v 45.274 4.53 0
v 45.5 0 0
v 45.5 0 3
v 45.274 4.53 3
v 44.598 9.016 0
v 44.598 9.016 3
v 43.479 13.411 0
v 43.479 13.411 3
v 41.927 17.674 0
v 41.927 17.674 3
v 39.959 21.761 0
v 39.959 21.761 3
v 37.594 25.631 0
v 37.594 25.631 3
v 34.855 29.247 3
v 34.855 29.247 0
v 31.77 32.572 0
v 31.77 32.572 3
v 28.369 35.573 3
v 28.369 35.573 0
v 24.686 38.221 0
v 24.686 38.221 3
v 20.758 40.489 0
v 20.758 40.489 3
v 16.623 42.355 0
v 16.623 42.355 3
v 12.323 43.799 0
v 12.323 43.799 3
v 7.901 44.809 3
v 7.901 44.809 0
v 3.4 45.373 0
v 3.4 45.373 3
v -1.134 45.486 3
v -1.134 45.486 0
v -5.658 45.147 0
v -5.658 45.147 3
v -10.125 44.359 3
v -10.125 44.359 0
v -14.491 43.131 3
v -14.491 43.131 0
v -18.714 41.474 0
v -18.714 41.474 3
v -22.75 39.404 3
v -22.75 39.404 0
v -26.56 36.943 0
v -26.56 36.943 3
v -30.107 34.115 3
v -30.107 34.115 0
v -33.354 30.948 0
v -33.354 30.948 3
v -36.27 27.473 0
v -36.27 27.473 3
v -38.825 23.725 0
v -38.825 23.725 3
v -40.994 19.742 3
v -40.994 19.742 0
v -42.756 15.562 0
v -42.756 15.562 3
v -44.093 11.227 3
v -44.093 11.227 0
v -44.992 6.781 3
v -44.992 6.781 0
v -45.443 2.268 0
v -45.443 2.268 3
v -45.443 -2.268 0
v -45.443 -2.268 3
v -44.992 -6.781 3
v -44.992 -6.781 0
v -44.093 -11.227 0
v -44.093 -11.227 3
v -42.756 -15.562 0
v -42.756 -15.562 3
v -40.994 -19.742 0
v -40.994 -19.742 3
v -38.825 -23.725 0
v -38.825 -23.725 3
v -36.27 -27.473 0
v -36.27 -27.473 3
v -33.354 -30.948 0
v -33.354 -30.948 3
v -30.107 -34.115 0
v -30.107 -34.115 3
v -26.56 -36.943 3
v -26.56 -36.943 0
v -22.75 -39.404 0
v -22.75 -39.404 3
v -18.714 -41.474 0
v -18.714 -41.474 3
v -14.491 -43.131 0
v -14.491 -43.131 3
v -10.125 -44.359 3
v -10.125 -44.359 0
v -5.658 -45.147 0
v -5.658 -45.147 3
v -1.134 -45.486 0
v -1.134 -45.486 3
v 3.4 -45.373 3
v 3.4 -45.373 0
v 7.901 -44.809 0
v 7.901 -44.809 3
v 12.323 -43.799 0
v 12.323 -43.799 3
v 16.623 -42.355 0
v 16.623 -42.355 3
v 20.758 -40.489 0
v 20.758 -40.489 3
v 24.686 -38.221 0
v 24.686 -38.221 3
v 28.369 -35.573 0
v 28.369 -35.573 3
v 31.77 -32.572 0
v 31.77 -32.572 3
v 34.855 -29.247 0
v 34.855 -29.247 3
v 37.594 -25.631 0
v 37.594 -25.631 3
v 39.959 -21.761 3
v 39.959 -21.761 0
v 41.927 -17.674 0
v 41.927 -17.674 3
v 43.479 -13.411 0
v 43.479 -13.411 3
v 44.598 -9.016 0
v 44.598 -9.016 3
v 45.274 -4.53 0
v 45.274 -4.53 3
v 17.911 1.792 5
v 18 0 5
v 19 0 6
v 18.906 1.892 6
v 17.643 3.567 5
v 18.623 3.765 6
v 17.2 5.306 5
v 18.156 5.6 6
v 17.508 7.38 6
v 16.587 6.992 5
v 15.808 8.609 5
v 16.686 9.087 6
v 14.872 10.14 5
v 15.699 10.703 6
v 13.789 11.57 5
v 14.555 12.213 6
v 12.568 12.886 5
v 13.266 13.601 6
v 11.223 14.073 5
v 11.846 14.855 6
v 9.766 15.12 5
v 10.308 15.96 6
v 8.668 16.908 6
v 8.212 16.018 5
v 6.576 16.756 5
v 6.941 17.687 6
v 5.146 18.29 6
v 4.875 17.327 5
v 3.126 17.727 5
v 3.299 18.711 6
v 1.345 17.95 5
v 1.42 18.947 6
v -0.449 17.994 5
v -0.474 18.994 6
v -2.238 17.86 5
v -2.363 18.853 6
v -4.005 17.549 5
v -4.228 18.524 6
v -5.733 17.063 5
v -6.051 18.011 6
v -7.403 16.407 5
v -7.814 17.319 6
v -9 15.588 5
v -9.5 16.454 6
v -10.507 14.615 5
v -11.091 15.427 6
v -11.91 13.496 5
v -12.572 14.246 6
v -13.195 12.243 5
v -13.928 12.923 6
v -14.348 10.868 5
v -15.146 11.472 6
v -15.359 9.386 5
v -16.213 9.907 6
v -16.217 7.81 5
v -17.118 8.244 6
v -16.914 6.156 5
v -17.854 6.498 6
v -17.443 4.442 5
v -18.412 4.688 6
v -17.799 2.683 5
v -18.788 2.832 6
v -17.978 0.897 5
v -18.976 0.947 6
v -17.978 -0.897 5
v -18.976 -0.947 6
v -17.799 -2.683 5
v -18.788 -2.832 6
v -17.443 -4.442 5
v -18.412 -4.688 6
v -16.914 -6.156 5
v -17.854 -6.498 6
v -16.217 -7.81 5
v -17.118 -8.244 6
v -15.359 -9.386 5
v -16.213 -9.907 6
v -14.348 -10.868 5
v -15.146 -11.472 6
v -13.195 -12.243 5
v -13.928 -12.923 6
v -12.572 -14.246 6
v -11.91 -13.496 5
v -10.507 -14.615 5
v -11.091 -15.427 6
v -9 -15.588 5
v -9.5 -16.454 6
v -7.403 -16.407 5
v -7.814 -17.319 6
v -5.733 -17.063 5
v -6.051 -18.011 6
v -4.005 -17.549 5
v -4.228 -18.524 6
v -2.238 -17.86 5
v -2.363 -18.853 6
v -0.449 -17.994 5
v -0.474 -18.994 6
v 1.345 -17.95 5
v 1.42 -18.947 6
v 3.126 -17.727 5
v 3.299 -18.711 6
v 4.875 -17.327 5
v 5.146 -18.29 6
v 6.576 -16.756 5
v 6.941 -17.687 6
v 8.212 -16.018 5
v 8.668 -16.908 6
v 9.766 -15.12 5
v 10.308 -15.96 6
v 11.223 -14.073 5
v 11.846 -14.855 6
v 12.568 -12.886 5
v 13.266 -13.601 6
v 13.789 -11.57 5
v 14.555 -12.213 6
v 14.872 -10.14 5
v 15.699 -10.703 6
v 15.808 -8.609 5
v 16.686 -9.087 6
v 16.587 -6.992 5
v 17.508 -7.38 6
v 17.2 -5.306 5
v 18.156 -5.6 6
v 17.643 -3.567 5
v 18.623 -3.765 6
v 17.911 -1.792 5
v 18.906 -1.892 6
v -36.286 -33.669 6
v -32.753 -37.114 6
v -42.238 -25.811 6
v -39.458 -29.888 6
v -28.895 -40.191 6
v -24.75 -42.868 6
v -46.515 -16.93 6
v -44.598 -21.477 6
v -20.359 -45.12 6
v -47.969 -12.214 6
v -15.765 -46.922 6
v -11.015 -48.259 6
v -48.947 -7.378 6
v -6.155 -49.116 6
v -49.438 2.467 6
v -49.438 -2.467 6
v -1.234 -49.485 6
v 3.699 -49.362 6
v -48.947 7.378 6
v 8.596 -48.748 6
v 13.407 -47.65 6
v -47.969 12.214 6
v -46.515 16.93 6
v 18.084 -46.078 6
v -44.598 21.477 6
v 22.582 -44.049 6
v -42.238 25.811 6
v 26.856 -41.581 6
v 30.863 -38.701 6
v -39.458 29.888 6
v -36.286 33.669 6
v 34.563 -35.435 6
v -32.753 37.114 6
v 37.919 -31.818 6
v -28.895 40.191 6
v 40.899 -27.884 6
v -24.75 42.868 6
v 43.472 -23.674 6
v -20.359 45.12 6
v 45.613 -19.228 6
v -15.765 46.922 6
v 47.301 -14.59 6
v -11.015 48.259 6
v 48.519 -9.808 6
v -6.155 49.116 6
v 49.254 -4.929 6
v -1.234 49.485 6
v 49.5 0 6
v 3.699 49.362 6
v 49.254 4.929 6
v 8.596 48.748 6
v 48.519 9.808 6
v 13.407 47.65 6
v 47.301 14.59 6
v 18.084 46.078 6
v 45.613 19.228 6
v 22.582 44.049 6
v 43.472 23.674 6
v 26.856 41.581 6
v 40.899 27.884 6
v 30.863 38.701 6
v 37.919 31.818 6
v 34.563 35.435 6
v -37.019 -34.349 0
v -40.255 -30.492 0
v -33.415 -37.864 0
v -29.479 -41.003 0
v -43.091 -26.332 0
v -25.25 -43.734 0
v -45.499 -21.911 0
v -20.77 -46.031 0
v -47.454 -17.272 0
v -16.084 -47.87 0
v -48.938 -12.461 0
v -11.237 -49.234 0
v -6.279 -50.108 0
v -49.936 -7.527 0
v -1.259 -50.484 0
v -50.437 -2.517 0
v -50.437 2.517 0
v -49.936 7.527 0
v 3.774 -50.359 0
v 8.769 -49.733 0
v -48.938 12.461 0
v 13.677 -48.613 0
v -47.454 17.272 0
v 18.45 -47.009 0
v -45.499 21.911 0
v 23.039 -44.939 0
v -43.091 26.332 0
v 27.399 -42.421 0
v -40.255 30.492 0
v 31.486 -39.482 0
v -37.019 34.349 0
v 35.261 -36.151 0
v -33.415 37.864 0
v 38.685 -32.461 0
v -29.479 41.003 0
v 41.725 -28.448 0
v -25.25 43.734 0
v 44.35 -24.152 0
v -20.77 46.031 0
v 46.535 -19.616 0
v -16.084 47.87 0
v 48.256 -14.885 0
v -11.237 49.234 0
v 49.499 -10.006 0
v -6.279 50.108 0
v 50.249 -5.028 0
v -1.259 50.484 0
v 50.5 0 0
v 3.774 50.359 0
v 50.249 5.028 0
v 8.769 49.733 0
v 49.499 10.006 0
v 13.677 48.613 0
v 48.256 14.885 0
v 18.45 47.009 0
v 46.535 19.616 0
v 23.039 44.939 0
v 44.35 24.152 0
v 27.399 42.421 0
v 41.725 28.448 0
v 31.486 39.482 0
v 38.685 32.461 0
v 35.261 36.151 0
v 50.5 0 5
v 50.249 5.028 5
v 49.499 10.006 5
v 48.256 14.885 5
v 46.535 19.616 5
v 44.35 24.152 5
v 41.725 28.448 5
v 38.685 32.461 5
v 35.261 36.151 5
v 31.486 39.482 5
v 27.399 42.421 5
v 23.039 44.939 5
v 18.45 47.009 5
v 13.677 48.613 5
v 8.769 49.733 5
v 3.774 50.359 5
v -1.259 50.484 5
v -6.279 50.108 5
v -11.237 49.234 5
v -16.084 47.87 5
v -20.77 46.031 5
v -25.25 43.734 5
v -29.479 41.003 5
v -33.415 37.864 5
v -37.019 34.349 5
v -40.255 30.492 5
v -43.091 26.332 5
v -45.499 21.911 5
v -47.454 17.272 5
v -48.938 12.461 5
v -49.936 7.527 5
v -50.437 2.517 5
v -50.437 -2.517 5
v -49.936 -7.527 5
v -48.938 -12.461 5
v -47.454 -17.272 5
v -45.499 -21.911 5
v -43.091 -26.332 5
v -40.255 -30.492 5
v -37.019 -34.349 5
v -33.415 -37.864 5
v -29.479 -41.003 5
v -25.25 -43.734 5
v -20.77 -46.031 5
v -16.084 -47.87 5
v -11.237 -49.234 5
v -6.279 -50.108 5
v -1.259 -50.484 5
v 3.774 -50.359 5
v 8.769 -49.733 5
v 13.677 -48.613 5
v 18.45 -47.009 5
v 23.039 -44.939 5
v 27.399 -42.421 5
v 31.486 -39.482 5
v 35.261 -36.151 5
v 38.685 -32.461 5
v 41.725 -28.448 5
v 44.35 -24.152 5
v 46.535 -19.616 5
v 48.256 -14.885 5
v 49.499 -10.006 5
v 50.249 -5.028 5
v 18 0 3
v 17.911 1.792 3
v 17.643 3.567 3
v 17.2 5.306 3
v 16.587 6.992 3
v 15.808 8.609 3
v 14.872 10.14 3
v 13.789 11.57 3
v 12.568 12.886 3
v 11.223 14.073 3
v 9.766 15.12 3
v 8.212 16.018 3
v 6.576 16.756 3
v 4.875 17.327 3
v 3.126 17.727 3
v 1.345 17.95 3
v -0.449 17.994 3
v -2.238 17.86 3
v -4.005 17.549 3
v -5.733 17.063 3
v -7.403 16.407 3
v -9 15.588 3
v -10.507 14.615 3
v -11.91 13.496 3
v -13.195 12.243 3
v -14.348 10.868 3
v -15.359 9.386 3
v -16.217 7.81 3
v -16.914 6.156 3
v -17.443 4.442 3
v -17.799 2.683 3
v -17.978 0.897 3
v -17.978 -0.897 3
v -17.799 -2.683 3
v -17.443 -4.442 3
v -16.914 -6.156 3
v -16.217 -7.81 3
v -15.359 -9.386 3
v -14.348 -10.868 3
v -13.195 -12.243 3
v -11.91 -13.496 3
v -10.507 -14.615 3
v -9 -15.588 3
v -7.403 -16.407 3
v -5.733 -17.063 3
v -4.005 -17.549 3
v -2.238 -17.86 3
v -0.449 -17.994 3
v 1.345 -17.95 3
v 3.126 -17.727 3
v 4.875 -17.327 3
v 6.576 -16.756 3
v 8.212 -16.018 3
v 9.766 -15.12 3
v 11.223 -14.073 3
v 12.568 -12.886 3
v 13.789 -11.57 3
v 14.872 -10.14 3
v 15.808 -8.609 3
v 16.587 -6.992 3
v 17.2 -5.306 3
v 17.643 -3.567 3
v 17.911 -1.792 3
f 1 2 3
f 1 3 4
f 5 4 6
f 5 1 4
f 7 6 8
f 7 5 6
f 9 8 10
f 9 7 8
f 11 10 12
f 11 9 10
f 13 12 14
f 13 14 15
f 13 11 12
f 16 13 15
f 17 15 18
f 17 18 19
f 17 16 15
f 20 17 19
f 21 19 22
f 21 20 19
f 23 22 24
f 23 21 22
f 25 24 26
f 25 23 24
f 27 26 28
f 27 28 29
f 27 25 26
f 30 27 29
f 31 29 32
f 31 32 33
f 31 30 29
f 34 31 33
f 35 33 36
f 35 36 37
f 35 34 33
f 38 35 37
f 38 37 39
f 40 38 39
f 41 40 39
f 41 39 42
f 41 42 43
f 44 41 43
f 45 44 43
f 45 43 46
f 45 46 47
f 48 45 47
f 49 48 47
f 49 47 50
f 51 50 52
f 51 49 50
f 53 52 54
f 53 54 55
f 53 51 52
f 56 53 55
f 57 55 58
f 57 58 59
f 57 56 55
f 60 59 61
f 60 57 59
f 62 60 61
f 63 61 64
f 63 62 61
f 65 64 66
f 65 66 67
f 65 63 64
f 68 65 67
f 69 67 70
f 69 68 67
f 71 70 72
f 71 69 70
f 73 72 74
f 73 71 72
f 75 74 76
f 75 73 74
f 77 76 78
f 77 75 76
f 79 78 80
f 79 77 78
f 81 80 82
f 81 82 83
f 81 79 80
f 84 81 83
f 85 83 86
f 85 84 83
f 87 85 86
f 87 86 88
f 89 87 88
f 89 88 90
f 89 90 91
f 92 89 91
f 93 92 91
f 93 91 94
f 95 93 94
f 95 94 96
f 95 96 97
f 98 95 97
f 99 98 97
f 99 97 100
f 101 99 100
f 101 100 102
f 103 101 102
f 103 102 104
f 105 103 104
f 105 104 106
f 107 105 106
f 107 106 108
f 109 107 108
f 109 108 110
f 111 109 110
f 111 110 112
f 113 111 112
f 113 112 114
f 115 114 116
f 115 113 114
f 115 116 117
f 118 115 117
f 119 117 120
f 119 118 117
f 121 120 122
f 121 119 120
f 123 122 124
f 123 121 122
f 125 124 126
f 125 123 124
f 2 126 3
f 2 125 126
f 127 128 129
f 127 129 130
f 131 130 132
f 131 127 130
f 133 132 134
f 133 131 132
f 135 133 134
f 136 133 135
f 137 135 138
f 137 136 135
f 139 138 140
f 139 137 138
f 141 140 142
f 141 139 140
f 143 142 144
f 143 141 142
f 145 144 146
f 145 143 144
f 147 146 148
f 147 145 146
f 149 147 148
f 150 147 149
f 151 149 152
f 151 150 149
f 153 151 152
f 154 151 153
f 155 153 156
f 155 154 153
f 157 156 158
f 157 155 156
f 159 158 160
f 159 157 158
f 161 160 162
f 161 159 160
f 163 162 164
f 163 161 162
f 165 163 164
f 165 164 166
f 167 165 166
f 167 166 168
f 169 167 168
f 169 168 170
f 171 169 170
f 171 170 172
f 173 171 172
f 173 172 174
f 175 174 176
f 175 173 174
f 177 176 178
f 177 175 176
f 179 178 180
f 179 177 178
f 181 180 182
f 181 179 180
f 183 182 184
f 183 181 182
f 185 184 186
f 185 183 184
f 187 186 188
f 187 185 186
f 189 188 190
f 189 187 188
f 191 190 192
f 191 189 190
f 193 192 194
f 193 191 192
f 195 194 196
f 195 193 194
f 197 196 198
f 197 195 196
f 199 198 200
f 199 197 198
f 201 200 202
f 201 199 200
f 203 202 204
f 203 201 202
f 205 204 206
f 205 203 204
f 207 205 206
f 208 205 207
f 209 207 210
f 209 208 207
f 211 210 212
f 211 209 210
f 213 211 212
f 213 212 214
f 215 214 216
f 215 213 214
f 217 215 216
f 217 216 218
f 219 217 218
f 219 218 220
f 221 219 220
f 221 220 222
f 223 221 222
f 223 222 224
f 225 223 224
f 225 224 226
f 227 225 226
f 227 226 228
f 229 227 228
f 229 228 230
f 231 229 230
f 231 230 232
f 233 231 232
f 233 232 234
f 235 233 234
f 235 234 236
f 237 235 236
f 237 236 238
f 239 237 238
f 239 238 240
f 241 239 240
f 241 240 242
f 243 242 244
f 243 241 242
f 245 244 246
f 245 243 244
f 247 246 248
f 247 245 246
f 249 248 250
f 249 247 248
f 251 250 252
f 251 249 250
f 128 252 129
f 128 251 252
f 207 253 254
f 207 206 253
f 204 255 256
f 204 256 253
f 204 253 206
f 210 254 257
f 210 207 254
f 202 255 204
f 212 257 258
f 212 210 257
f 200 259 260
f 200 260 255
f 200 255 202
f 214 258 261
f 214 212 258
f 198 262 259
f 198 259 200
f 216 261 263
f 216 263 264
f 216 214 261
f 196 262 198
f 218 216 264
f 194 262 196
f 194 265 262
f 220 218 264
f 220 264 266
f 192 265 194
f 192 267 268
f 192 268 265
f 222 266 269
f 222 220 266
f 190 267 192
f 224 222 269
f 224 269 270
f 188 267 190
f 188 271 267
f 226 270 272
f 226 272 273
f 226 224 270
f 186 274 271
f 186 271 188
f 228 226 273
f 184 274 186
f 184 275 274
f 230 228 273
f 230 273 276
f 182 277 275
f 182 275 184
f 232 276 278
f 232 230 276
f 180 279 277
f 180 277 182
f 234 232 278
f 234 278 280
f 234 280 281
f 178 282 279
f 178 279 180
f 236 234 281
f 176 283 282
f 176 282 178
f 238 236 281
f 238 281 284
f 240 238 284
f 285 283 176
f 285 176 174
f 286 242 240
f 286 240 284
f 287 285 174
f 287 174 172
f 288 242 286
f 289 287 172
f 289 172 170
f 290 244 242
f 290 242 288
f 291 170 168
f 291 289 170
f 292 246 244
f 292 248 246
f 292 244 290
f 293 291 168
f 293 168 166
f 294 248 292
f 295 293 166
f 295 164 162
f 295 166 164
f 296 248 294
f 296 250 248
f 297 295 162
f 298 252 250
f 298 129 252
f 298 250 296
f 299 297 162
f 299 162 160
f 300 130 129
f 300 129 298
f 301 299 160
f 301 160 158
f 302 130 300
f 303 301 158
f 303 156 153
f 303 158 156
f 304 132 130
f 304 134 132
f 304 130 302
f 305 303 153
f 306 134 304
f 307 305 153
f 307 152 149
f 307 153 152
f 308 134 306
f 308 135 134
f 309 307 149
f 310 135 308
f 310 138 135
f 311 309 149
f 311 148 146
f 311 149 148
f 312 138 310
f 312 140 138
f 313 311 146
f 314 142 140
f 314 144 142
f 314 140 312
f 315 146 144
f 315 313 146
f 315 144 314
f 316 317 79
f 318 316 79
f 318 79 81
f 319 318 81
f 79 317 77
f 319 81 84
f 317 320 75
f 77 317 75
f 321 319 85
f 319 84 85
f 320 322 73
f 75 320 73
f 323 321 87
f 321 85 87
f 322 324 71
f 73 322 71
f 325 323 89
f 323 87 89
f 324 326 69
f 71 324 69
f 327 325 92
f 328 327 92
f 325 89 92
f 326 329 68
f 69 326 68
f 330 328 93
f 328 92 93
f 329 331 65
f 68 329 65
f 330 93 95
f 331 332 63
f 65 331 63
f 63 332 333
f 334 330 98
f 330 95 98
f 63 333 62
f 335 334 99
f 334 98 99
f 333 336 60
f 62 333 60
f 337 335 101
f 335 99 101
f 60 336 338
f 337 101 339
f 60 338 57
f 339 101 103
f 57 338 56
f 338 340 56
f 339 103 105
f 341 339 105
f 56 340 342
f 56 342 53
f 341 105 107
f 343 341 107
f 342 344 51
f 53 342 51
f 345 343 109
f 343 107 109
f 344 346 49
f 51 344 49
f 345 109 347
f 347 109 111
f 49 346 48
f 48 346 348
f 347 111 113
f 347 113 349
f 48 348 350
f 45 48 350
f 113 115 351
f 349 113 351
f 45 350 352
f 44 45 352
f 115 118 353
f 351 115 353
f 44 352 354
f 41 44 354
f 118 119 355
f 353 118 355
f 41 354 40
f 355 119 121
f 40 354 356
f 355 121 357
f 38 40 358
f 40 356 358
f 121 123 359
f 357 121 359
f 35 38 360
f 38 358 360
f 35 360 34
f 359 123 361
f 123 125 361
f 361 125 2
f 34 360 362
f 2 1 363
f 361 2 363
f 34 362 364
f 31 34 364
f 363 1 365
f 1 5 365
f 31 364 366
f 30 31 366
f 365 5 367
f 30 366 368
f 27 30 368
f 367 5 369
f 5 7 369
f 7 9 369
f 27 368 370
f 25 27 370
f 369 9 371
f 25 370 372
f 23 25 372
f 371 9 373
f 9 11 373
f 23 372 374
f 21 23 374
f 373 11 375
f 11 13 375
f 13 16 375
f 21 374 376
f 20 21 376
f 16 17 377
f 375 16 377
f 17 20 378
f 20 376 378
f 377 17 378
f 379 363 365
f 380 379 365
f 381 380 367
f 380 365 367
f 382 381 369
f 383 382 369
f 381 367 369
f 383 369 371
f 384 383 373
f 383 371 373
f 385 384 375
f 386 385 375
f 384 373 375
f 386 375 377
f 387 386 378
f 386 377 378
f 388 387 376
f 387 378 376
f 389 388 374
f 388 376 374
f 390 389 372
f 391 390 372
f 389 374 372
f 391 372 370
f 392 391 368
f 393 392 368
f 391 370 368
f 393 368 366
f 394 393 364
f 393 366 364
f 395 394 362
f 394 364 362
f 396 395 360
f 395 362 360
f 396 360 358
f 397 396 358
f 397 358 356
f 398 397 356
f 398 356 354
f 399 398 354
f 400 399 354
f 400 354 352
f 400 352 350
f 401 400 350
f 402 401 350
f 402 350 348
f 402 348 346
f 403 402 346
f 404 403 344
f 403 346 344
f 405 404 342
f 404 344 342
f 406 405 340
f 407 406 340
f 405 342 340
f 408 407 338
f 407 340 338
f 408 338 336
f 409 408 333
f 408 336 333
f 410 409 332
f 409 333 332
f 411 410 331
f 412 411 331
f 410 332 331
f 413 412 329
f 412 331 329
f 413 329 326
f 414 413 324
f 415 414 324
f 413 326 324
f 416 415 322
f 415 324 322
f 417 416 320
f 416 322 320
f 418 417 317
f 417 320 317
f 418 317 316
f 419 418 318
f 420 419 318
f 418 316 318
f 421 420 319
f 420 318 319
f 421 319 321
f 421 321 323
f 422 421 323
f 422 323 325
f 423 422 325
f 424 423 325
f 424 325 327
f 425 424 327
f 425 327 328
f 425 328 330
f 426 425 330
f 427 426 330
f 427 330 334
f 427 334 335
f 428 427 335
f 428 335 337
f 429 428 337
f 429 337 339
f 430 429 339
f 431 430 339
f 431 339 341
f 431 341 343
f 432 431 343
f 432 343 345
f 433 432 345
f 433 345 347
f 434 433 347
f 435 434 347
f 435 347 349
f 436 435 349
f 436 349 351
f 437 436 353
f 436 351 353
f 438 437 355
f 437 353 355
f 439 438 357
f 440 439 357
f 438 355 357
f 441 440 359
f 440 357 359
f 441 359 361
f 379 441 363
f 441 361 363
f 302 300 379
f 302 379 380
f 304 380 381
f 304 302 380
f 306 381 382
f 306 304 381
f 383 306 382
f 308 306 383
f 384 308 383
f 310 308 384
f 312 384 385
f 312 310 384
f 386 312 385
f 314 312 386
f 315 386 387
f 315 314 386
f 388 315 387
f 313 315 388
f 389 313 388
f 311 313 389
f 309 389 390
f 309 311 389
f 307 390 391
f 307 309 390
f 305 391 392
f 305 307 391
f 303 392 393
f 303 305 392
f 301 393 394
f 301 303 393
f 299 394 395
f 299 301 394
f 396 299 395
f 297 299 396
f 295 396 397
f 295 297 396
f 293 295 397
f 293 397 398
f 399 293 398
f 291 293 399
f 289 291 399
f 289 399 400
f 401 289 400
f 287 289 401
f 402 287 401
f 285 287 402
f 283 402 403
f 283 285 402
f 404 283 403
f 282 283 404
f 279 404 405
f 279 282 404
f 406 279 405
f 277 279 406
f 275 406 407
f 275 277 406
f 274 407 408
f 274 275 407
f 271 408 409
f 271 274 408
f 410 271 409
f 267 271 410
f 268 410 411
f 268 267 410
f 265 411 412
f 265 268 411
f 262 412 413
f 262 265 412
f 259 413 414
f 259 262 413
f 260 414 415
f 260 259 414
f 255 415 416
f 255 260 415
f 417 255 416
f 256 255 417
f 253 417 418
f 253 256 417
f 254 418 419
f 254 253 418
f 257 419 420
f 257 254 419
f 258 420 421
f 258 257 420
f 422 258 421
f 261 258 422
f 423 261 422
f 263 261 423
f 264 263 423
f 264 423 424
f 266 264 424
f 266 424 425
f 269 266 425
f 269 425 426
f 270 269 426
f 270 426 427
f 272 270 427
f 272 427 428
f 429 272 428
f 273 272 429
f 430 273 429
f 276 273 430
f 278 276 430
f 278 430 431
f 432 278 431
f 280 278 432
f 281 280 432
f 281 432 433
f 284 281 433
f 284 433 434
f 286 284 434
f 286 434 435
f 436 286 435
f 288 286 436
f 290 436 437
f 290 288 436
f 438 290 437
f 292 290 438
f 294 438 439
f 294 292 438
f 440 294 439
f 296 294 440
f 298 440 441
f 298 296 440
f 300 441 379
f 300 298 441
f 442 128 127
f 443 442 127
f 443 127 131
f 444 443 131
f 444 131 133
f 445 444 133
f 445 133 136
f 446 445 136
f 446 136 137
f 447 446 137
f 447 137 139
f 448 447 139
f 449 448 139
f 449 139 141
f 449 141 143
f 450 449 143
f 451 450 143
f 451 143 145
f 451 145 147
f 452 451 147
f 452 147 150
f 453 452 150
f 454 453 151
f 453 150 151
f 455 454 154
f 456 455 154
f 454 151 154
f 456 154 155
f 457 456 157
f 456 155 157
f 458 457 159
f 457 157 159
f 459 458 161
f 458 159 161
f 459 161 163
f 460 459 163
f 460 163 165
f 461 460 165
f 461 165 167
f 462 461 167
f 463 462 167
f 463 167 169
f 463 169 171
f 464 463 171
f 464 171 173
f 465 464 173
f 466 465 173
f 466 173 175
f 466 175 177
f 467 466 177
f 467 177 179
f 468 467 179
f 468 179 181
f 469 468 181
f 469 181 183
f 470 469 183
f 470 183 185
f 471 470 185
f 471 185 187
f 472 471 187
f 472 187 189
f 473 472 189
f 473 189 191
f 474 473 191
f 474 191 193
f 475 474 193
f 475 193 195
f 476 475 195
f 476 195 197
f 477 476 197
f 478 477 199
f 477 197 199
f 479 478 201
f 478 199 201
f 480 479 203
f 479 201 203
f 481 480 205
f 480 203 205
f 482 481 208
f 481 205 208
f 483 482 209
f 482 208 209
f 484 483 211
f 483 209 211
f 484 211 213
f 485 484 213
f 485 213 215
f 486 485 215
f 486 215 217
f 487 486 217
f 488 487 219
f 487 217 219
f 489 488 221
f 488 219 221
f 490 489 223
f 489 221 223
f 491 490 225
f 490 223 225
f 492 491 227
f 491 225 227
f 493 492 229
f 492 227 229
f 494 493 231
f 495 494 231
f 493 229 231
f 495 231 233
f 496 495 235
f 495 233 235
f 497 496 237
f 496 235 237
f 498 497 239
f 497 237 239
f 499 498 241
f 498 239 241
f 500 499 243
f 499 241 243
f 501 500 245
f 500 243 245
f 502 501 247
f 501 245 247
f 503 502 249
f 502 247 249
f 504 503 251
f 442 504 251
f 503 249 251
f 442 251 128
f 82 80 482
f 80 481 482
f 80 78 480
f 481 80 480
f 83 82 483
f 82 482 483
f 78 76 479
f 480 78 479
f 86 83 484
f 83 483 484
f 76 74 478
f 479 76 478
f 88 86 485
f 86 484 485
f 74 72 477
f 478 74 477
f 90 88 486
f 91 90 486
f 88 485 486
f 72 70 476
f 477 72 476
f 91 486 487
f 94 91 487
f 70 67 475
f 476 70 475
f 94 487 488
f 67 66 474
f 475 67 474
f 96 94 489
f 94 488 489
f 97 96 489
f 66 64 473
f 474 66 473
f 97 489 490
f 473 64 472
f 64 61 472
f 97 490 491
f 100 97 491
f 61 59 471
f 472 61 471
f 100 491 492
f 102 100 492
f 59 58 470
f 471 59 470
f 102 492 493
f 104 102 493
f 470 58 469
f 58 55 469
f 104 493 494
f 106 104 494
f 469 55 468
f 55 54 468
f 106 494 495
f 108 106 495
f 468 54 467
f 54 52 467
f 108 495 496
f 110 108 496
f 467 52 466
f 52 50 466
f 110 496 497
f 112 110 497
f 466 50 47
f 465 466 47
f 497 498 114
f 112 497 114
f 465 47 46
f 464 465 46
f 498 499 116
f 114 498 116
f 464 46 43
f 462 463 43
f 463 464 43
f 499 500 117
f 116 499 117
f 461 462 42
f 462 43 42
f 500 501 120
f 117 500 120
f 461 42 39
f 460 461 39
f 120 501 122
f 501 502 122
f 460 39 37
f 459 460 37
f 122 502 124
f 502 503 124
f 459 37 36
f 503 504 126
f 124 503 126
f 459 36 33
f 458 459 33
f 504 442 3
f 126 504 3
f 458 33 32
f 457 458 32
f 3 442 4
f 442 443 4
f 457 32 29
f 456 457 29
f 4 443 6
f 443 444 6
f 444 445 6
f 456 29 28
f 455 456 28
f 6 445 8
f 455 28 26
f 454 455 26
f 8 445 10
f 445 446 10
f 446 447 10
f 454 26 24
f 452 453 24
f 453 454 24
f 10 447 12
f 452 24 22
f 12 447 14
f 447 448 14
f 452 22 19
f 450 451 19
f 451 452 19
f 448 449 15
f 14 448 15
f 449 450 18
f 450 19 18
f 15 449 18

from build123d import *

# Parameters (mm, degrees)
F0_R     = 50.5
F0_R_2   = 45.5
F1_DEPTH = 6
F2_DEPTH = 3
F3_R     = 18
F4_DEPTH = 6.001
F5_SIZE  = 1


with BuildPart() as f1:
    # F0 (on Top) → F1 (new body)
    with BuildSketch(Plane.XY):
        Circle(F0_R)
        Circle(F0_R_2, mode=Mode.SUBTRACT)
        Circle(F0_R_2)
    extrude(amount=F1_DEPTH)

    # F0 (on Top) → F2 (cut)
    with BuildSketch(Plane.XY):
        Circle(F0_R_2)
    extrude(amount=F2_DEPTH, mode=Mode.SUBTRACT)

    # F3 (on face) → F4 (cut, through all)
    with BuildSketch(Plane.XY.offset(6)):
        Circle(F3_R)
    extrude(amount=-F4_DEPTH, mode=Mode.SUBTRACT)

    # F5
    f5_edges = [f1.edges().sort_by_distance(p)[0] for p in [
        (-18, 0, 6),
        (-50.5, 0, 6),
    ]]
    chamfer(f5_edges, length=F5_SIZE)


solid = f1.part
